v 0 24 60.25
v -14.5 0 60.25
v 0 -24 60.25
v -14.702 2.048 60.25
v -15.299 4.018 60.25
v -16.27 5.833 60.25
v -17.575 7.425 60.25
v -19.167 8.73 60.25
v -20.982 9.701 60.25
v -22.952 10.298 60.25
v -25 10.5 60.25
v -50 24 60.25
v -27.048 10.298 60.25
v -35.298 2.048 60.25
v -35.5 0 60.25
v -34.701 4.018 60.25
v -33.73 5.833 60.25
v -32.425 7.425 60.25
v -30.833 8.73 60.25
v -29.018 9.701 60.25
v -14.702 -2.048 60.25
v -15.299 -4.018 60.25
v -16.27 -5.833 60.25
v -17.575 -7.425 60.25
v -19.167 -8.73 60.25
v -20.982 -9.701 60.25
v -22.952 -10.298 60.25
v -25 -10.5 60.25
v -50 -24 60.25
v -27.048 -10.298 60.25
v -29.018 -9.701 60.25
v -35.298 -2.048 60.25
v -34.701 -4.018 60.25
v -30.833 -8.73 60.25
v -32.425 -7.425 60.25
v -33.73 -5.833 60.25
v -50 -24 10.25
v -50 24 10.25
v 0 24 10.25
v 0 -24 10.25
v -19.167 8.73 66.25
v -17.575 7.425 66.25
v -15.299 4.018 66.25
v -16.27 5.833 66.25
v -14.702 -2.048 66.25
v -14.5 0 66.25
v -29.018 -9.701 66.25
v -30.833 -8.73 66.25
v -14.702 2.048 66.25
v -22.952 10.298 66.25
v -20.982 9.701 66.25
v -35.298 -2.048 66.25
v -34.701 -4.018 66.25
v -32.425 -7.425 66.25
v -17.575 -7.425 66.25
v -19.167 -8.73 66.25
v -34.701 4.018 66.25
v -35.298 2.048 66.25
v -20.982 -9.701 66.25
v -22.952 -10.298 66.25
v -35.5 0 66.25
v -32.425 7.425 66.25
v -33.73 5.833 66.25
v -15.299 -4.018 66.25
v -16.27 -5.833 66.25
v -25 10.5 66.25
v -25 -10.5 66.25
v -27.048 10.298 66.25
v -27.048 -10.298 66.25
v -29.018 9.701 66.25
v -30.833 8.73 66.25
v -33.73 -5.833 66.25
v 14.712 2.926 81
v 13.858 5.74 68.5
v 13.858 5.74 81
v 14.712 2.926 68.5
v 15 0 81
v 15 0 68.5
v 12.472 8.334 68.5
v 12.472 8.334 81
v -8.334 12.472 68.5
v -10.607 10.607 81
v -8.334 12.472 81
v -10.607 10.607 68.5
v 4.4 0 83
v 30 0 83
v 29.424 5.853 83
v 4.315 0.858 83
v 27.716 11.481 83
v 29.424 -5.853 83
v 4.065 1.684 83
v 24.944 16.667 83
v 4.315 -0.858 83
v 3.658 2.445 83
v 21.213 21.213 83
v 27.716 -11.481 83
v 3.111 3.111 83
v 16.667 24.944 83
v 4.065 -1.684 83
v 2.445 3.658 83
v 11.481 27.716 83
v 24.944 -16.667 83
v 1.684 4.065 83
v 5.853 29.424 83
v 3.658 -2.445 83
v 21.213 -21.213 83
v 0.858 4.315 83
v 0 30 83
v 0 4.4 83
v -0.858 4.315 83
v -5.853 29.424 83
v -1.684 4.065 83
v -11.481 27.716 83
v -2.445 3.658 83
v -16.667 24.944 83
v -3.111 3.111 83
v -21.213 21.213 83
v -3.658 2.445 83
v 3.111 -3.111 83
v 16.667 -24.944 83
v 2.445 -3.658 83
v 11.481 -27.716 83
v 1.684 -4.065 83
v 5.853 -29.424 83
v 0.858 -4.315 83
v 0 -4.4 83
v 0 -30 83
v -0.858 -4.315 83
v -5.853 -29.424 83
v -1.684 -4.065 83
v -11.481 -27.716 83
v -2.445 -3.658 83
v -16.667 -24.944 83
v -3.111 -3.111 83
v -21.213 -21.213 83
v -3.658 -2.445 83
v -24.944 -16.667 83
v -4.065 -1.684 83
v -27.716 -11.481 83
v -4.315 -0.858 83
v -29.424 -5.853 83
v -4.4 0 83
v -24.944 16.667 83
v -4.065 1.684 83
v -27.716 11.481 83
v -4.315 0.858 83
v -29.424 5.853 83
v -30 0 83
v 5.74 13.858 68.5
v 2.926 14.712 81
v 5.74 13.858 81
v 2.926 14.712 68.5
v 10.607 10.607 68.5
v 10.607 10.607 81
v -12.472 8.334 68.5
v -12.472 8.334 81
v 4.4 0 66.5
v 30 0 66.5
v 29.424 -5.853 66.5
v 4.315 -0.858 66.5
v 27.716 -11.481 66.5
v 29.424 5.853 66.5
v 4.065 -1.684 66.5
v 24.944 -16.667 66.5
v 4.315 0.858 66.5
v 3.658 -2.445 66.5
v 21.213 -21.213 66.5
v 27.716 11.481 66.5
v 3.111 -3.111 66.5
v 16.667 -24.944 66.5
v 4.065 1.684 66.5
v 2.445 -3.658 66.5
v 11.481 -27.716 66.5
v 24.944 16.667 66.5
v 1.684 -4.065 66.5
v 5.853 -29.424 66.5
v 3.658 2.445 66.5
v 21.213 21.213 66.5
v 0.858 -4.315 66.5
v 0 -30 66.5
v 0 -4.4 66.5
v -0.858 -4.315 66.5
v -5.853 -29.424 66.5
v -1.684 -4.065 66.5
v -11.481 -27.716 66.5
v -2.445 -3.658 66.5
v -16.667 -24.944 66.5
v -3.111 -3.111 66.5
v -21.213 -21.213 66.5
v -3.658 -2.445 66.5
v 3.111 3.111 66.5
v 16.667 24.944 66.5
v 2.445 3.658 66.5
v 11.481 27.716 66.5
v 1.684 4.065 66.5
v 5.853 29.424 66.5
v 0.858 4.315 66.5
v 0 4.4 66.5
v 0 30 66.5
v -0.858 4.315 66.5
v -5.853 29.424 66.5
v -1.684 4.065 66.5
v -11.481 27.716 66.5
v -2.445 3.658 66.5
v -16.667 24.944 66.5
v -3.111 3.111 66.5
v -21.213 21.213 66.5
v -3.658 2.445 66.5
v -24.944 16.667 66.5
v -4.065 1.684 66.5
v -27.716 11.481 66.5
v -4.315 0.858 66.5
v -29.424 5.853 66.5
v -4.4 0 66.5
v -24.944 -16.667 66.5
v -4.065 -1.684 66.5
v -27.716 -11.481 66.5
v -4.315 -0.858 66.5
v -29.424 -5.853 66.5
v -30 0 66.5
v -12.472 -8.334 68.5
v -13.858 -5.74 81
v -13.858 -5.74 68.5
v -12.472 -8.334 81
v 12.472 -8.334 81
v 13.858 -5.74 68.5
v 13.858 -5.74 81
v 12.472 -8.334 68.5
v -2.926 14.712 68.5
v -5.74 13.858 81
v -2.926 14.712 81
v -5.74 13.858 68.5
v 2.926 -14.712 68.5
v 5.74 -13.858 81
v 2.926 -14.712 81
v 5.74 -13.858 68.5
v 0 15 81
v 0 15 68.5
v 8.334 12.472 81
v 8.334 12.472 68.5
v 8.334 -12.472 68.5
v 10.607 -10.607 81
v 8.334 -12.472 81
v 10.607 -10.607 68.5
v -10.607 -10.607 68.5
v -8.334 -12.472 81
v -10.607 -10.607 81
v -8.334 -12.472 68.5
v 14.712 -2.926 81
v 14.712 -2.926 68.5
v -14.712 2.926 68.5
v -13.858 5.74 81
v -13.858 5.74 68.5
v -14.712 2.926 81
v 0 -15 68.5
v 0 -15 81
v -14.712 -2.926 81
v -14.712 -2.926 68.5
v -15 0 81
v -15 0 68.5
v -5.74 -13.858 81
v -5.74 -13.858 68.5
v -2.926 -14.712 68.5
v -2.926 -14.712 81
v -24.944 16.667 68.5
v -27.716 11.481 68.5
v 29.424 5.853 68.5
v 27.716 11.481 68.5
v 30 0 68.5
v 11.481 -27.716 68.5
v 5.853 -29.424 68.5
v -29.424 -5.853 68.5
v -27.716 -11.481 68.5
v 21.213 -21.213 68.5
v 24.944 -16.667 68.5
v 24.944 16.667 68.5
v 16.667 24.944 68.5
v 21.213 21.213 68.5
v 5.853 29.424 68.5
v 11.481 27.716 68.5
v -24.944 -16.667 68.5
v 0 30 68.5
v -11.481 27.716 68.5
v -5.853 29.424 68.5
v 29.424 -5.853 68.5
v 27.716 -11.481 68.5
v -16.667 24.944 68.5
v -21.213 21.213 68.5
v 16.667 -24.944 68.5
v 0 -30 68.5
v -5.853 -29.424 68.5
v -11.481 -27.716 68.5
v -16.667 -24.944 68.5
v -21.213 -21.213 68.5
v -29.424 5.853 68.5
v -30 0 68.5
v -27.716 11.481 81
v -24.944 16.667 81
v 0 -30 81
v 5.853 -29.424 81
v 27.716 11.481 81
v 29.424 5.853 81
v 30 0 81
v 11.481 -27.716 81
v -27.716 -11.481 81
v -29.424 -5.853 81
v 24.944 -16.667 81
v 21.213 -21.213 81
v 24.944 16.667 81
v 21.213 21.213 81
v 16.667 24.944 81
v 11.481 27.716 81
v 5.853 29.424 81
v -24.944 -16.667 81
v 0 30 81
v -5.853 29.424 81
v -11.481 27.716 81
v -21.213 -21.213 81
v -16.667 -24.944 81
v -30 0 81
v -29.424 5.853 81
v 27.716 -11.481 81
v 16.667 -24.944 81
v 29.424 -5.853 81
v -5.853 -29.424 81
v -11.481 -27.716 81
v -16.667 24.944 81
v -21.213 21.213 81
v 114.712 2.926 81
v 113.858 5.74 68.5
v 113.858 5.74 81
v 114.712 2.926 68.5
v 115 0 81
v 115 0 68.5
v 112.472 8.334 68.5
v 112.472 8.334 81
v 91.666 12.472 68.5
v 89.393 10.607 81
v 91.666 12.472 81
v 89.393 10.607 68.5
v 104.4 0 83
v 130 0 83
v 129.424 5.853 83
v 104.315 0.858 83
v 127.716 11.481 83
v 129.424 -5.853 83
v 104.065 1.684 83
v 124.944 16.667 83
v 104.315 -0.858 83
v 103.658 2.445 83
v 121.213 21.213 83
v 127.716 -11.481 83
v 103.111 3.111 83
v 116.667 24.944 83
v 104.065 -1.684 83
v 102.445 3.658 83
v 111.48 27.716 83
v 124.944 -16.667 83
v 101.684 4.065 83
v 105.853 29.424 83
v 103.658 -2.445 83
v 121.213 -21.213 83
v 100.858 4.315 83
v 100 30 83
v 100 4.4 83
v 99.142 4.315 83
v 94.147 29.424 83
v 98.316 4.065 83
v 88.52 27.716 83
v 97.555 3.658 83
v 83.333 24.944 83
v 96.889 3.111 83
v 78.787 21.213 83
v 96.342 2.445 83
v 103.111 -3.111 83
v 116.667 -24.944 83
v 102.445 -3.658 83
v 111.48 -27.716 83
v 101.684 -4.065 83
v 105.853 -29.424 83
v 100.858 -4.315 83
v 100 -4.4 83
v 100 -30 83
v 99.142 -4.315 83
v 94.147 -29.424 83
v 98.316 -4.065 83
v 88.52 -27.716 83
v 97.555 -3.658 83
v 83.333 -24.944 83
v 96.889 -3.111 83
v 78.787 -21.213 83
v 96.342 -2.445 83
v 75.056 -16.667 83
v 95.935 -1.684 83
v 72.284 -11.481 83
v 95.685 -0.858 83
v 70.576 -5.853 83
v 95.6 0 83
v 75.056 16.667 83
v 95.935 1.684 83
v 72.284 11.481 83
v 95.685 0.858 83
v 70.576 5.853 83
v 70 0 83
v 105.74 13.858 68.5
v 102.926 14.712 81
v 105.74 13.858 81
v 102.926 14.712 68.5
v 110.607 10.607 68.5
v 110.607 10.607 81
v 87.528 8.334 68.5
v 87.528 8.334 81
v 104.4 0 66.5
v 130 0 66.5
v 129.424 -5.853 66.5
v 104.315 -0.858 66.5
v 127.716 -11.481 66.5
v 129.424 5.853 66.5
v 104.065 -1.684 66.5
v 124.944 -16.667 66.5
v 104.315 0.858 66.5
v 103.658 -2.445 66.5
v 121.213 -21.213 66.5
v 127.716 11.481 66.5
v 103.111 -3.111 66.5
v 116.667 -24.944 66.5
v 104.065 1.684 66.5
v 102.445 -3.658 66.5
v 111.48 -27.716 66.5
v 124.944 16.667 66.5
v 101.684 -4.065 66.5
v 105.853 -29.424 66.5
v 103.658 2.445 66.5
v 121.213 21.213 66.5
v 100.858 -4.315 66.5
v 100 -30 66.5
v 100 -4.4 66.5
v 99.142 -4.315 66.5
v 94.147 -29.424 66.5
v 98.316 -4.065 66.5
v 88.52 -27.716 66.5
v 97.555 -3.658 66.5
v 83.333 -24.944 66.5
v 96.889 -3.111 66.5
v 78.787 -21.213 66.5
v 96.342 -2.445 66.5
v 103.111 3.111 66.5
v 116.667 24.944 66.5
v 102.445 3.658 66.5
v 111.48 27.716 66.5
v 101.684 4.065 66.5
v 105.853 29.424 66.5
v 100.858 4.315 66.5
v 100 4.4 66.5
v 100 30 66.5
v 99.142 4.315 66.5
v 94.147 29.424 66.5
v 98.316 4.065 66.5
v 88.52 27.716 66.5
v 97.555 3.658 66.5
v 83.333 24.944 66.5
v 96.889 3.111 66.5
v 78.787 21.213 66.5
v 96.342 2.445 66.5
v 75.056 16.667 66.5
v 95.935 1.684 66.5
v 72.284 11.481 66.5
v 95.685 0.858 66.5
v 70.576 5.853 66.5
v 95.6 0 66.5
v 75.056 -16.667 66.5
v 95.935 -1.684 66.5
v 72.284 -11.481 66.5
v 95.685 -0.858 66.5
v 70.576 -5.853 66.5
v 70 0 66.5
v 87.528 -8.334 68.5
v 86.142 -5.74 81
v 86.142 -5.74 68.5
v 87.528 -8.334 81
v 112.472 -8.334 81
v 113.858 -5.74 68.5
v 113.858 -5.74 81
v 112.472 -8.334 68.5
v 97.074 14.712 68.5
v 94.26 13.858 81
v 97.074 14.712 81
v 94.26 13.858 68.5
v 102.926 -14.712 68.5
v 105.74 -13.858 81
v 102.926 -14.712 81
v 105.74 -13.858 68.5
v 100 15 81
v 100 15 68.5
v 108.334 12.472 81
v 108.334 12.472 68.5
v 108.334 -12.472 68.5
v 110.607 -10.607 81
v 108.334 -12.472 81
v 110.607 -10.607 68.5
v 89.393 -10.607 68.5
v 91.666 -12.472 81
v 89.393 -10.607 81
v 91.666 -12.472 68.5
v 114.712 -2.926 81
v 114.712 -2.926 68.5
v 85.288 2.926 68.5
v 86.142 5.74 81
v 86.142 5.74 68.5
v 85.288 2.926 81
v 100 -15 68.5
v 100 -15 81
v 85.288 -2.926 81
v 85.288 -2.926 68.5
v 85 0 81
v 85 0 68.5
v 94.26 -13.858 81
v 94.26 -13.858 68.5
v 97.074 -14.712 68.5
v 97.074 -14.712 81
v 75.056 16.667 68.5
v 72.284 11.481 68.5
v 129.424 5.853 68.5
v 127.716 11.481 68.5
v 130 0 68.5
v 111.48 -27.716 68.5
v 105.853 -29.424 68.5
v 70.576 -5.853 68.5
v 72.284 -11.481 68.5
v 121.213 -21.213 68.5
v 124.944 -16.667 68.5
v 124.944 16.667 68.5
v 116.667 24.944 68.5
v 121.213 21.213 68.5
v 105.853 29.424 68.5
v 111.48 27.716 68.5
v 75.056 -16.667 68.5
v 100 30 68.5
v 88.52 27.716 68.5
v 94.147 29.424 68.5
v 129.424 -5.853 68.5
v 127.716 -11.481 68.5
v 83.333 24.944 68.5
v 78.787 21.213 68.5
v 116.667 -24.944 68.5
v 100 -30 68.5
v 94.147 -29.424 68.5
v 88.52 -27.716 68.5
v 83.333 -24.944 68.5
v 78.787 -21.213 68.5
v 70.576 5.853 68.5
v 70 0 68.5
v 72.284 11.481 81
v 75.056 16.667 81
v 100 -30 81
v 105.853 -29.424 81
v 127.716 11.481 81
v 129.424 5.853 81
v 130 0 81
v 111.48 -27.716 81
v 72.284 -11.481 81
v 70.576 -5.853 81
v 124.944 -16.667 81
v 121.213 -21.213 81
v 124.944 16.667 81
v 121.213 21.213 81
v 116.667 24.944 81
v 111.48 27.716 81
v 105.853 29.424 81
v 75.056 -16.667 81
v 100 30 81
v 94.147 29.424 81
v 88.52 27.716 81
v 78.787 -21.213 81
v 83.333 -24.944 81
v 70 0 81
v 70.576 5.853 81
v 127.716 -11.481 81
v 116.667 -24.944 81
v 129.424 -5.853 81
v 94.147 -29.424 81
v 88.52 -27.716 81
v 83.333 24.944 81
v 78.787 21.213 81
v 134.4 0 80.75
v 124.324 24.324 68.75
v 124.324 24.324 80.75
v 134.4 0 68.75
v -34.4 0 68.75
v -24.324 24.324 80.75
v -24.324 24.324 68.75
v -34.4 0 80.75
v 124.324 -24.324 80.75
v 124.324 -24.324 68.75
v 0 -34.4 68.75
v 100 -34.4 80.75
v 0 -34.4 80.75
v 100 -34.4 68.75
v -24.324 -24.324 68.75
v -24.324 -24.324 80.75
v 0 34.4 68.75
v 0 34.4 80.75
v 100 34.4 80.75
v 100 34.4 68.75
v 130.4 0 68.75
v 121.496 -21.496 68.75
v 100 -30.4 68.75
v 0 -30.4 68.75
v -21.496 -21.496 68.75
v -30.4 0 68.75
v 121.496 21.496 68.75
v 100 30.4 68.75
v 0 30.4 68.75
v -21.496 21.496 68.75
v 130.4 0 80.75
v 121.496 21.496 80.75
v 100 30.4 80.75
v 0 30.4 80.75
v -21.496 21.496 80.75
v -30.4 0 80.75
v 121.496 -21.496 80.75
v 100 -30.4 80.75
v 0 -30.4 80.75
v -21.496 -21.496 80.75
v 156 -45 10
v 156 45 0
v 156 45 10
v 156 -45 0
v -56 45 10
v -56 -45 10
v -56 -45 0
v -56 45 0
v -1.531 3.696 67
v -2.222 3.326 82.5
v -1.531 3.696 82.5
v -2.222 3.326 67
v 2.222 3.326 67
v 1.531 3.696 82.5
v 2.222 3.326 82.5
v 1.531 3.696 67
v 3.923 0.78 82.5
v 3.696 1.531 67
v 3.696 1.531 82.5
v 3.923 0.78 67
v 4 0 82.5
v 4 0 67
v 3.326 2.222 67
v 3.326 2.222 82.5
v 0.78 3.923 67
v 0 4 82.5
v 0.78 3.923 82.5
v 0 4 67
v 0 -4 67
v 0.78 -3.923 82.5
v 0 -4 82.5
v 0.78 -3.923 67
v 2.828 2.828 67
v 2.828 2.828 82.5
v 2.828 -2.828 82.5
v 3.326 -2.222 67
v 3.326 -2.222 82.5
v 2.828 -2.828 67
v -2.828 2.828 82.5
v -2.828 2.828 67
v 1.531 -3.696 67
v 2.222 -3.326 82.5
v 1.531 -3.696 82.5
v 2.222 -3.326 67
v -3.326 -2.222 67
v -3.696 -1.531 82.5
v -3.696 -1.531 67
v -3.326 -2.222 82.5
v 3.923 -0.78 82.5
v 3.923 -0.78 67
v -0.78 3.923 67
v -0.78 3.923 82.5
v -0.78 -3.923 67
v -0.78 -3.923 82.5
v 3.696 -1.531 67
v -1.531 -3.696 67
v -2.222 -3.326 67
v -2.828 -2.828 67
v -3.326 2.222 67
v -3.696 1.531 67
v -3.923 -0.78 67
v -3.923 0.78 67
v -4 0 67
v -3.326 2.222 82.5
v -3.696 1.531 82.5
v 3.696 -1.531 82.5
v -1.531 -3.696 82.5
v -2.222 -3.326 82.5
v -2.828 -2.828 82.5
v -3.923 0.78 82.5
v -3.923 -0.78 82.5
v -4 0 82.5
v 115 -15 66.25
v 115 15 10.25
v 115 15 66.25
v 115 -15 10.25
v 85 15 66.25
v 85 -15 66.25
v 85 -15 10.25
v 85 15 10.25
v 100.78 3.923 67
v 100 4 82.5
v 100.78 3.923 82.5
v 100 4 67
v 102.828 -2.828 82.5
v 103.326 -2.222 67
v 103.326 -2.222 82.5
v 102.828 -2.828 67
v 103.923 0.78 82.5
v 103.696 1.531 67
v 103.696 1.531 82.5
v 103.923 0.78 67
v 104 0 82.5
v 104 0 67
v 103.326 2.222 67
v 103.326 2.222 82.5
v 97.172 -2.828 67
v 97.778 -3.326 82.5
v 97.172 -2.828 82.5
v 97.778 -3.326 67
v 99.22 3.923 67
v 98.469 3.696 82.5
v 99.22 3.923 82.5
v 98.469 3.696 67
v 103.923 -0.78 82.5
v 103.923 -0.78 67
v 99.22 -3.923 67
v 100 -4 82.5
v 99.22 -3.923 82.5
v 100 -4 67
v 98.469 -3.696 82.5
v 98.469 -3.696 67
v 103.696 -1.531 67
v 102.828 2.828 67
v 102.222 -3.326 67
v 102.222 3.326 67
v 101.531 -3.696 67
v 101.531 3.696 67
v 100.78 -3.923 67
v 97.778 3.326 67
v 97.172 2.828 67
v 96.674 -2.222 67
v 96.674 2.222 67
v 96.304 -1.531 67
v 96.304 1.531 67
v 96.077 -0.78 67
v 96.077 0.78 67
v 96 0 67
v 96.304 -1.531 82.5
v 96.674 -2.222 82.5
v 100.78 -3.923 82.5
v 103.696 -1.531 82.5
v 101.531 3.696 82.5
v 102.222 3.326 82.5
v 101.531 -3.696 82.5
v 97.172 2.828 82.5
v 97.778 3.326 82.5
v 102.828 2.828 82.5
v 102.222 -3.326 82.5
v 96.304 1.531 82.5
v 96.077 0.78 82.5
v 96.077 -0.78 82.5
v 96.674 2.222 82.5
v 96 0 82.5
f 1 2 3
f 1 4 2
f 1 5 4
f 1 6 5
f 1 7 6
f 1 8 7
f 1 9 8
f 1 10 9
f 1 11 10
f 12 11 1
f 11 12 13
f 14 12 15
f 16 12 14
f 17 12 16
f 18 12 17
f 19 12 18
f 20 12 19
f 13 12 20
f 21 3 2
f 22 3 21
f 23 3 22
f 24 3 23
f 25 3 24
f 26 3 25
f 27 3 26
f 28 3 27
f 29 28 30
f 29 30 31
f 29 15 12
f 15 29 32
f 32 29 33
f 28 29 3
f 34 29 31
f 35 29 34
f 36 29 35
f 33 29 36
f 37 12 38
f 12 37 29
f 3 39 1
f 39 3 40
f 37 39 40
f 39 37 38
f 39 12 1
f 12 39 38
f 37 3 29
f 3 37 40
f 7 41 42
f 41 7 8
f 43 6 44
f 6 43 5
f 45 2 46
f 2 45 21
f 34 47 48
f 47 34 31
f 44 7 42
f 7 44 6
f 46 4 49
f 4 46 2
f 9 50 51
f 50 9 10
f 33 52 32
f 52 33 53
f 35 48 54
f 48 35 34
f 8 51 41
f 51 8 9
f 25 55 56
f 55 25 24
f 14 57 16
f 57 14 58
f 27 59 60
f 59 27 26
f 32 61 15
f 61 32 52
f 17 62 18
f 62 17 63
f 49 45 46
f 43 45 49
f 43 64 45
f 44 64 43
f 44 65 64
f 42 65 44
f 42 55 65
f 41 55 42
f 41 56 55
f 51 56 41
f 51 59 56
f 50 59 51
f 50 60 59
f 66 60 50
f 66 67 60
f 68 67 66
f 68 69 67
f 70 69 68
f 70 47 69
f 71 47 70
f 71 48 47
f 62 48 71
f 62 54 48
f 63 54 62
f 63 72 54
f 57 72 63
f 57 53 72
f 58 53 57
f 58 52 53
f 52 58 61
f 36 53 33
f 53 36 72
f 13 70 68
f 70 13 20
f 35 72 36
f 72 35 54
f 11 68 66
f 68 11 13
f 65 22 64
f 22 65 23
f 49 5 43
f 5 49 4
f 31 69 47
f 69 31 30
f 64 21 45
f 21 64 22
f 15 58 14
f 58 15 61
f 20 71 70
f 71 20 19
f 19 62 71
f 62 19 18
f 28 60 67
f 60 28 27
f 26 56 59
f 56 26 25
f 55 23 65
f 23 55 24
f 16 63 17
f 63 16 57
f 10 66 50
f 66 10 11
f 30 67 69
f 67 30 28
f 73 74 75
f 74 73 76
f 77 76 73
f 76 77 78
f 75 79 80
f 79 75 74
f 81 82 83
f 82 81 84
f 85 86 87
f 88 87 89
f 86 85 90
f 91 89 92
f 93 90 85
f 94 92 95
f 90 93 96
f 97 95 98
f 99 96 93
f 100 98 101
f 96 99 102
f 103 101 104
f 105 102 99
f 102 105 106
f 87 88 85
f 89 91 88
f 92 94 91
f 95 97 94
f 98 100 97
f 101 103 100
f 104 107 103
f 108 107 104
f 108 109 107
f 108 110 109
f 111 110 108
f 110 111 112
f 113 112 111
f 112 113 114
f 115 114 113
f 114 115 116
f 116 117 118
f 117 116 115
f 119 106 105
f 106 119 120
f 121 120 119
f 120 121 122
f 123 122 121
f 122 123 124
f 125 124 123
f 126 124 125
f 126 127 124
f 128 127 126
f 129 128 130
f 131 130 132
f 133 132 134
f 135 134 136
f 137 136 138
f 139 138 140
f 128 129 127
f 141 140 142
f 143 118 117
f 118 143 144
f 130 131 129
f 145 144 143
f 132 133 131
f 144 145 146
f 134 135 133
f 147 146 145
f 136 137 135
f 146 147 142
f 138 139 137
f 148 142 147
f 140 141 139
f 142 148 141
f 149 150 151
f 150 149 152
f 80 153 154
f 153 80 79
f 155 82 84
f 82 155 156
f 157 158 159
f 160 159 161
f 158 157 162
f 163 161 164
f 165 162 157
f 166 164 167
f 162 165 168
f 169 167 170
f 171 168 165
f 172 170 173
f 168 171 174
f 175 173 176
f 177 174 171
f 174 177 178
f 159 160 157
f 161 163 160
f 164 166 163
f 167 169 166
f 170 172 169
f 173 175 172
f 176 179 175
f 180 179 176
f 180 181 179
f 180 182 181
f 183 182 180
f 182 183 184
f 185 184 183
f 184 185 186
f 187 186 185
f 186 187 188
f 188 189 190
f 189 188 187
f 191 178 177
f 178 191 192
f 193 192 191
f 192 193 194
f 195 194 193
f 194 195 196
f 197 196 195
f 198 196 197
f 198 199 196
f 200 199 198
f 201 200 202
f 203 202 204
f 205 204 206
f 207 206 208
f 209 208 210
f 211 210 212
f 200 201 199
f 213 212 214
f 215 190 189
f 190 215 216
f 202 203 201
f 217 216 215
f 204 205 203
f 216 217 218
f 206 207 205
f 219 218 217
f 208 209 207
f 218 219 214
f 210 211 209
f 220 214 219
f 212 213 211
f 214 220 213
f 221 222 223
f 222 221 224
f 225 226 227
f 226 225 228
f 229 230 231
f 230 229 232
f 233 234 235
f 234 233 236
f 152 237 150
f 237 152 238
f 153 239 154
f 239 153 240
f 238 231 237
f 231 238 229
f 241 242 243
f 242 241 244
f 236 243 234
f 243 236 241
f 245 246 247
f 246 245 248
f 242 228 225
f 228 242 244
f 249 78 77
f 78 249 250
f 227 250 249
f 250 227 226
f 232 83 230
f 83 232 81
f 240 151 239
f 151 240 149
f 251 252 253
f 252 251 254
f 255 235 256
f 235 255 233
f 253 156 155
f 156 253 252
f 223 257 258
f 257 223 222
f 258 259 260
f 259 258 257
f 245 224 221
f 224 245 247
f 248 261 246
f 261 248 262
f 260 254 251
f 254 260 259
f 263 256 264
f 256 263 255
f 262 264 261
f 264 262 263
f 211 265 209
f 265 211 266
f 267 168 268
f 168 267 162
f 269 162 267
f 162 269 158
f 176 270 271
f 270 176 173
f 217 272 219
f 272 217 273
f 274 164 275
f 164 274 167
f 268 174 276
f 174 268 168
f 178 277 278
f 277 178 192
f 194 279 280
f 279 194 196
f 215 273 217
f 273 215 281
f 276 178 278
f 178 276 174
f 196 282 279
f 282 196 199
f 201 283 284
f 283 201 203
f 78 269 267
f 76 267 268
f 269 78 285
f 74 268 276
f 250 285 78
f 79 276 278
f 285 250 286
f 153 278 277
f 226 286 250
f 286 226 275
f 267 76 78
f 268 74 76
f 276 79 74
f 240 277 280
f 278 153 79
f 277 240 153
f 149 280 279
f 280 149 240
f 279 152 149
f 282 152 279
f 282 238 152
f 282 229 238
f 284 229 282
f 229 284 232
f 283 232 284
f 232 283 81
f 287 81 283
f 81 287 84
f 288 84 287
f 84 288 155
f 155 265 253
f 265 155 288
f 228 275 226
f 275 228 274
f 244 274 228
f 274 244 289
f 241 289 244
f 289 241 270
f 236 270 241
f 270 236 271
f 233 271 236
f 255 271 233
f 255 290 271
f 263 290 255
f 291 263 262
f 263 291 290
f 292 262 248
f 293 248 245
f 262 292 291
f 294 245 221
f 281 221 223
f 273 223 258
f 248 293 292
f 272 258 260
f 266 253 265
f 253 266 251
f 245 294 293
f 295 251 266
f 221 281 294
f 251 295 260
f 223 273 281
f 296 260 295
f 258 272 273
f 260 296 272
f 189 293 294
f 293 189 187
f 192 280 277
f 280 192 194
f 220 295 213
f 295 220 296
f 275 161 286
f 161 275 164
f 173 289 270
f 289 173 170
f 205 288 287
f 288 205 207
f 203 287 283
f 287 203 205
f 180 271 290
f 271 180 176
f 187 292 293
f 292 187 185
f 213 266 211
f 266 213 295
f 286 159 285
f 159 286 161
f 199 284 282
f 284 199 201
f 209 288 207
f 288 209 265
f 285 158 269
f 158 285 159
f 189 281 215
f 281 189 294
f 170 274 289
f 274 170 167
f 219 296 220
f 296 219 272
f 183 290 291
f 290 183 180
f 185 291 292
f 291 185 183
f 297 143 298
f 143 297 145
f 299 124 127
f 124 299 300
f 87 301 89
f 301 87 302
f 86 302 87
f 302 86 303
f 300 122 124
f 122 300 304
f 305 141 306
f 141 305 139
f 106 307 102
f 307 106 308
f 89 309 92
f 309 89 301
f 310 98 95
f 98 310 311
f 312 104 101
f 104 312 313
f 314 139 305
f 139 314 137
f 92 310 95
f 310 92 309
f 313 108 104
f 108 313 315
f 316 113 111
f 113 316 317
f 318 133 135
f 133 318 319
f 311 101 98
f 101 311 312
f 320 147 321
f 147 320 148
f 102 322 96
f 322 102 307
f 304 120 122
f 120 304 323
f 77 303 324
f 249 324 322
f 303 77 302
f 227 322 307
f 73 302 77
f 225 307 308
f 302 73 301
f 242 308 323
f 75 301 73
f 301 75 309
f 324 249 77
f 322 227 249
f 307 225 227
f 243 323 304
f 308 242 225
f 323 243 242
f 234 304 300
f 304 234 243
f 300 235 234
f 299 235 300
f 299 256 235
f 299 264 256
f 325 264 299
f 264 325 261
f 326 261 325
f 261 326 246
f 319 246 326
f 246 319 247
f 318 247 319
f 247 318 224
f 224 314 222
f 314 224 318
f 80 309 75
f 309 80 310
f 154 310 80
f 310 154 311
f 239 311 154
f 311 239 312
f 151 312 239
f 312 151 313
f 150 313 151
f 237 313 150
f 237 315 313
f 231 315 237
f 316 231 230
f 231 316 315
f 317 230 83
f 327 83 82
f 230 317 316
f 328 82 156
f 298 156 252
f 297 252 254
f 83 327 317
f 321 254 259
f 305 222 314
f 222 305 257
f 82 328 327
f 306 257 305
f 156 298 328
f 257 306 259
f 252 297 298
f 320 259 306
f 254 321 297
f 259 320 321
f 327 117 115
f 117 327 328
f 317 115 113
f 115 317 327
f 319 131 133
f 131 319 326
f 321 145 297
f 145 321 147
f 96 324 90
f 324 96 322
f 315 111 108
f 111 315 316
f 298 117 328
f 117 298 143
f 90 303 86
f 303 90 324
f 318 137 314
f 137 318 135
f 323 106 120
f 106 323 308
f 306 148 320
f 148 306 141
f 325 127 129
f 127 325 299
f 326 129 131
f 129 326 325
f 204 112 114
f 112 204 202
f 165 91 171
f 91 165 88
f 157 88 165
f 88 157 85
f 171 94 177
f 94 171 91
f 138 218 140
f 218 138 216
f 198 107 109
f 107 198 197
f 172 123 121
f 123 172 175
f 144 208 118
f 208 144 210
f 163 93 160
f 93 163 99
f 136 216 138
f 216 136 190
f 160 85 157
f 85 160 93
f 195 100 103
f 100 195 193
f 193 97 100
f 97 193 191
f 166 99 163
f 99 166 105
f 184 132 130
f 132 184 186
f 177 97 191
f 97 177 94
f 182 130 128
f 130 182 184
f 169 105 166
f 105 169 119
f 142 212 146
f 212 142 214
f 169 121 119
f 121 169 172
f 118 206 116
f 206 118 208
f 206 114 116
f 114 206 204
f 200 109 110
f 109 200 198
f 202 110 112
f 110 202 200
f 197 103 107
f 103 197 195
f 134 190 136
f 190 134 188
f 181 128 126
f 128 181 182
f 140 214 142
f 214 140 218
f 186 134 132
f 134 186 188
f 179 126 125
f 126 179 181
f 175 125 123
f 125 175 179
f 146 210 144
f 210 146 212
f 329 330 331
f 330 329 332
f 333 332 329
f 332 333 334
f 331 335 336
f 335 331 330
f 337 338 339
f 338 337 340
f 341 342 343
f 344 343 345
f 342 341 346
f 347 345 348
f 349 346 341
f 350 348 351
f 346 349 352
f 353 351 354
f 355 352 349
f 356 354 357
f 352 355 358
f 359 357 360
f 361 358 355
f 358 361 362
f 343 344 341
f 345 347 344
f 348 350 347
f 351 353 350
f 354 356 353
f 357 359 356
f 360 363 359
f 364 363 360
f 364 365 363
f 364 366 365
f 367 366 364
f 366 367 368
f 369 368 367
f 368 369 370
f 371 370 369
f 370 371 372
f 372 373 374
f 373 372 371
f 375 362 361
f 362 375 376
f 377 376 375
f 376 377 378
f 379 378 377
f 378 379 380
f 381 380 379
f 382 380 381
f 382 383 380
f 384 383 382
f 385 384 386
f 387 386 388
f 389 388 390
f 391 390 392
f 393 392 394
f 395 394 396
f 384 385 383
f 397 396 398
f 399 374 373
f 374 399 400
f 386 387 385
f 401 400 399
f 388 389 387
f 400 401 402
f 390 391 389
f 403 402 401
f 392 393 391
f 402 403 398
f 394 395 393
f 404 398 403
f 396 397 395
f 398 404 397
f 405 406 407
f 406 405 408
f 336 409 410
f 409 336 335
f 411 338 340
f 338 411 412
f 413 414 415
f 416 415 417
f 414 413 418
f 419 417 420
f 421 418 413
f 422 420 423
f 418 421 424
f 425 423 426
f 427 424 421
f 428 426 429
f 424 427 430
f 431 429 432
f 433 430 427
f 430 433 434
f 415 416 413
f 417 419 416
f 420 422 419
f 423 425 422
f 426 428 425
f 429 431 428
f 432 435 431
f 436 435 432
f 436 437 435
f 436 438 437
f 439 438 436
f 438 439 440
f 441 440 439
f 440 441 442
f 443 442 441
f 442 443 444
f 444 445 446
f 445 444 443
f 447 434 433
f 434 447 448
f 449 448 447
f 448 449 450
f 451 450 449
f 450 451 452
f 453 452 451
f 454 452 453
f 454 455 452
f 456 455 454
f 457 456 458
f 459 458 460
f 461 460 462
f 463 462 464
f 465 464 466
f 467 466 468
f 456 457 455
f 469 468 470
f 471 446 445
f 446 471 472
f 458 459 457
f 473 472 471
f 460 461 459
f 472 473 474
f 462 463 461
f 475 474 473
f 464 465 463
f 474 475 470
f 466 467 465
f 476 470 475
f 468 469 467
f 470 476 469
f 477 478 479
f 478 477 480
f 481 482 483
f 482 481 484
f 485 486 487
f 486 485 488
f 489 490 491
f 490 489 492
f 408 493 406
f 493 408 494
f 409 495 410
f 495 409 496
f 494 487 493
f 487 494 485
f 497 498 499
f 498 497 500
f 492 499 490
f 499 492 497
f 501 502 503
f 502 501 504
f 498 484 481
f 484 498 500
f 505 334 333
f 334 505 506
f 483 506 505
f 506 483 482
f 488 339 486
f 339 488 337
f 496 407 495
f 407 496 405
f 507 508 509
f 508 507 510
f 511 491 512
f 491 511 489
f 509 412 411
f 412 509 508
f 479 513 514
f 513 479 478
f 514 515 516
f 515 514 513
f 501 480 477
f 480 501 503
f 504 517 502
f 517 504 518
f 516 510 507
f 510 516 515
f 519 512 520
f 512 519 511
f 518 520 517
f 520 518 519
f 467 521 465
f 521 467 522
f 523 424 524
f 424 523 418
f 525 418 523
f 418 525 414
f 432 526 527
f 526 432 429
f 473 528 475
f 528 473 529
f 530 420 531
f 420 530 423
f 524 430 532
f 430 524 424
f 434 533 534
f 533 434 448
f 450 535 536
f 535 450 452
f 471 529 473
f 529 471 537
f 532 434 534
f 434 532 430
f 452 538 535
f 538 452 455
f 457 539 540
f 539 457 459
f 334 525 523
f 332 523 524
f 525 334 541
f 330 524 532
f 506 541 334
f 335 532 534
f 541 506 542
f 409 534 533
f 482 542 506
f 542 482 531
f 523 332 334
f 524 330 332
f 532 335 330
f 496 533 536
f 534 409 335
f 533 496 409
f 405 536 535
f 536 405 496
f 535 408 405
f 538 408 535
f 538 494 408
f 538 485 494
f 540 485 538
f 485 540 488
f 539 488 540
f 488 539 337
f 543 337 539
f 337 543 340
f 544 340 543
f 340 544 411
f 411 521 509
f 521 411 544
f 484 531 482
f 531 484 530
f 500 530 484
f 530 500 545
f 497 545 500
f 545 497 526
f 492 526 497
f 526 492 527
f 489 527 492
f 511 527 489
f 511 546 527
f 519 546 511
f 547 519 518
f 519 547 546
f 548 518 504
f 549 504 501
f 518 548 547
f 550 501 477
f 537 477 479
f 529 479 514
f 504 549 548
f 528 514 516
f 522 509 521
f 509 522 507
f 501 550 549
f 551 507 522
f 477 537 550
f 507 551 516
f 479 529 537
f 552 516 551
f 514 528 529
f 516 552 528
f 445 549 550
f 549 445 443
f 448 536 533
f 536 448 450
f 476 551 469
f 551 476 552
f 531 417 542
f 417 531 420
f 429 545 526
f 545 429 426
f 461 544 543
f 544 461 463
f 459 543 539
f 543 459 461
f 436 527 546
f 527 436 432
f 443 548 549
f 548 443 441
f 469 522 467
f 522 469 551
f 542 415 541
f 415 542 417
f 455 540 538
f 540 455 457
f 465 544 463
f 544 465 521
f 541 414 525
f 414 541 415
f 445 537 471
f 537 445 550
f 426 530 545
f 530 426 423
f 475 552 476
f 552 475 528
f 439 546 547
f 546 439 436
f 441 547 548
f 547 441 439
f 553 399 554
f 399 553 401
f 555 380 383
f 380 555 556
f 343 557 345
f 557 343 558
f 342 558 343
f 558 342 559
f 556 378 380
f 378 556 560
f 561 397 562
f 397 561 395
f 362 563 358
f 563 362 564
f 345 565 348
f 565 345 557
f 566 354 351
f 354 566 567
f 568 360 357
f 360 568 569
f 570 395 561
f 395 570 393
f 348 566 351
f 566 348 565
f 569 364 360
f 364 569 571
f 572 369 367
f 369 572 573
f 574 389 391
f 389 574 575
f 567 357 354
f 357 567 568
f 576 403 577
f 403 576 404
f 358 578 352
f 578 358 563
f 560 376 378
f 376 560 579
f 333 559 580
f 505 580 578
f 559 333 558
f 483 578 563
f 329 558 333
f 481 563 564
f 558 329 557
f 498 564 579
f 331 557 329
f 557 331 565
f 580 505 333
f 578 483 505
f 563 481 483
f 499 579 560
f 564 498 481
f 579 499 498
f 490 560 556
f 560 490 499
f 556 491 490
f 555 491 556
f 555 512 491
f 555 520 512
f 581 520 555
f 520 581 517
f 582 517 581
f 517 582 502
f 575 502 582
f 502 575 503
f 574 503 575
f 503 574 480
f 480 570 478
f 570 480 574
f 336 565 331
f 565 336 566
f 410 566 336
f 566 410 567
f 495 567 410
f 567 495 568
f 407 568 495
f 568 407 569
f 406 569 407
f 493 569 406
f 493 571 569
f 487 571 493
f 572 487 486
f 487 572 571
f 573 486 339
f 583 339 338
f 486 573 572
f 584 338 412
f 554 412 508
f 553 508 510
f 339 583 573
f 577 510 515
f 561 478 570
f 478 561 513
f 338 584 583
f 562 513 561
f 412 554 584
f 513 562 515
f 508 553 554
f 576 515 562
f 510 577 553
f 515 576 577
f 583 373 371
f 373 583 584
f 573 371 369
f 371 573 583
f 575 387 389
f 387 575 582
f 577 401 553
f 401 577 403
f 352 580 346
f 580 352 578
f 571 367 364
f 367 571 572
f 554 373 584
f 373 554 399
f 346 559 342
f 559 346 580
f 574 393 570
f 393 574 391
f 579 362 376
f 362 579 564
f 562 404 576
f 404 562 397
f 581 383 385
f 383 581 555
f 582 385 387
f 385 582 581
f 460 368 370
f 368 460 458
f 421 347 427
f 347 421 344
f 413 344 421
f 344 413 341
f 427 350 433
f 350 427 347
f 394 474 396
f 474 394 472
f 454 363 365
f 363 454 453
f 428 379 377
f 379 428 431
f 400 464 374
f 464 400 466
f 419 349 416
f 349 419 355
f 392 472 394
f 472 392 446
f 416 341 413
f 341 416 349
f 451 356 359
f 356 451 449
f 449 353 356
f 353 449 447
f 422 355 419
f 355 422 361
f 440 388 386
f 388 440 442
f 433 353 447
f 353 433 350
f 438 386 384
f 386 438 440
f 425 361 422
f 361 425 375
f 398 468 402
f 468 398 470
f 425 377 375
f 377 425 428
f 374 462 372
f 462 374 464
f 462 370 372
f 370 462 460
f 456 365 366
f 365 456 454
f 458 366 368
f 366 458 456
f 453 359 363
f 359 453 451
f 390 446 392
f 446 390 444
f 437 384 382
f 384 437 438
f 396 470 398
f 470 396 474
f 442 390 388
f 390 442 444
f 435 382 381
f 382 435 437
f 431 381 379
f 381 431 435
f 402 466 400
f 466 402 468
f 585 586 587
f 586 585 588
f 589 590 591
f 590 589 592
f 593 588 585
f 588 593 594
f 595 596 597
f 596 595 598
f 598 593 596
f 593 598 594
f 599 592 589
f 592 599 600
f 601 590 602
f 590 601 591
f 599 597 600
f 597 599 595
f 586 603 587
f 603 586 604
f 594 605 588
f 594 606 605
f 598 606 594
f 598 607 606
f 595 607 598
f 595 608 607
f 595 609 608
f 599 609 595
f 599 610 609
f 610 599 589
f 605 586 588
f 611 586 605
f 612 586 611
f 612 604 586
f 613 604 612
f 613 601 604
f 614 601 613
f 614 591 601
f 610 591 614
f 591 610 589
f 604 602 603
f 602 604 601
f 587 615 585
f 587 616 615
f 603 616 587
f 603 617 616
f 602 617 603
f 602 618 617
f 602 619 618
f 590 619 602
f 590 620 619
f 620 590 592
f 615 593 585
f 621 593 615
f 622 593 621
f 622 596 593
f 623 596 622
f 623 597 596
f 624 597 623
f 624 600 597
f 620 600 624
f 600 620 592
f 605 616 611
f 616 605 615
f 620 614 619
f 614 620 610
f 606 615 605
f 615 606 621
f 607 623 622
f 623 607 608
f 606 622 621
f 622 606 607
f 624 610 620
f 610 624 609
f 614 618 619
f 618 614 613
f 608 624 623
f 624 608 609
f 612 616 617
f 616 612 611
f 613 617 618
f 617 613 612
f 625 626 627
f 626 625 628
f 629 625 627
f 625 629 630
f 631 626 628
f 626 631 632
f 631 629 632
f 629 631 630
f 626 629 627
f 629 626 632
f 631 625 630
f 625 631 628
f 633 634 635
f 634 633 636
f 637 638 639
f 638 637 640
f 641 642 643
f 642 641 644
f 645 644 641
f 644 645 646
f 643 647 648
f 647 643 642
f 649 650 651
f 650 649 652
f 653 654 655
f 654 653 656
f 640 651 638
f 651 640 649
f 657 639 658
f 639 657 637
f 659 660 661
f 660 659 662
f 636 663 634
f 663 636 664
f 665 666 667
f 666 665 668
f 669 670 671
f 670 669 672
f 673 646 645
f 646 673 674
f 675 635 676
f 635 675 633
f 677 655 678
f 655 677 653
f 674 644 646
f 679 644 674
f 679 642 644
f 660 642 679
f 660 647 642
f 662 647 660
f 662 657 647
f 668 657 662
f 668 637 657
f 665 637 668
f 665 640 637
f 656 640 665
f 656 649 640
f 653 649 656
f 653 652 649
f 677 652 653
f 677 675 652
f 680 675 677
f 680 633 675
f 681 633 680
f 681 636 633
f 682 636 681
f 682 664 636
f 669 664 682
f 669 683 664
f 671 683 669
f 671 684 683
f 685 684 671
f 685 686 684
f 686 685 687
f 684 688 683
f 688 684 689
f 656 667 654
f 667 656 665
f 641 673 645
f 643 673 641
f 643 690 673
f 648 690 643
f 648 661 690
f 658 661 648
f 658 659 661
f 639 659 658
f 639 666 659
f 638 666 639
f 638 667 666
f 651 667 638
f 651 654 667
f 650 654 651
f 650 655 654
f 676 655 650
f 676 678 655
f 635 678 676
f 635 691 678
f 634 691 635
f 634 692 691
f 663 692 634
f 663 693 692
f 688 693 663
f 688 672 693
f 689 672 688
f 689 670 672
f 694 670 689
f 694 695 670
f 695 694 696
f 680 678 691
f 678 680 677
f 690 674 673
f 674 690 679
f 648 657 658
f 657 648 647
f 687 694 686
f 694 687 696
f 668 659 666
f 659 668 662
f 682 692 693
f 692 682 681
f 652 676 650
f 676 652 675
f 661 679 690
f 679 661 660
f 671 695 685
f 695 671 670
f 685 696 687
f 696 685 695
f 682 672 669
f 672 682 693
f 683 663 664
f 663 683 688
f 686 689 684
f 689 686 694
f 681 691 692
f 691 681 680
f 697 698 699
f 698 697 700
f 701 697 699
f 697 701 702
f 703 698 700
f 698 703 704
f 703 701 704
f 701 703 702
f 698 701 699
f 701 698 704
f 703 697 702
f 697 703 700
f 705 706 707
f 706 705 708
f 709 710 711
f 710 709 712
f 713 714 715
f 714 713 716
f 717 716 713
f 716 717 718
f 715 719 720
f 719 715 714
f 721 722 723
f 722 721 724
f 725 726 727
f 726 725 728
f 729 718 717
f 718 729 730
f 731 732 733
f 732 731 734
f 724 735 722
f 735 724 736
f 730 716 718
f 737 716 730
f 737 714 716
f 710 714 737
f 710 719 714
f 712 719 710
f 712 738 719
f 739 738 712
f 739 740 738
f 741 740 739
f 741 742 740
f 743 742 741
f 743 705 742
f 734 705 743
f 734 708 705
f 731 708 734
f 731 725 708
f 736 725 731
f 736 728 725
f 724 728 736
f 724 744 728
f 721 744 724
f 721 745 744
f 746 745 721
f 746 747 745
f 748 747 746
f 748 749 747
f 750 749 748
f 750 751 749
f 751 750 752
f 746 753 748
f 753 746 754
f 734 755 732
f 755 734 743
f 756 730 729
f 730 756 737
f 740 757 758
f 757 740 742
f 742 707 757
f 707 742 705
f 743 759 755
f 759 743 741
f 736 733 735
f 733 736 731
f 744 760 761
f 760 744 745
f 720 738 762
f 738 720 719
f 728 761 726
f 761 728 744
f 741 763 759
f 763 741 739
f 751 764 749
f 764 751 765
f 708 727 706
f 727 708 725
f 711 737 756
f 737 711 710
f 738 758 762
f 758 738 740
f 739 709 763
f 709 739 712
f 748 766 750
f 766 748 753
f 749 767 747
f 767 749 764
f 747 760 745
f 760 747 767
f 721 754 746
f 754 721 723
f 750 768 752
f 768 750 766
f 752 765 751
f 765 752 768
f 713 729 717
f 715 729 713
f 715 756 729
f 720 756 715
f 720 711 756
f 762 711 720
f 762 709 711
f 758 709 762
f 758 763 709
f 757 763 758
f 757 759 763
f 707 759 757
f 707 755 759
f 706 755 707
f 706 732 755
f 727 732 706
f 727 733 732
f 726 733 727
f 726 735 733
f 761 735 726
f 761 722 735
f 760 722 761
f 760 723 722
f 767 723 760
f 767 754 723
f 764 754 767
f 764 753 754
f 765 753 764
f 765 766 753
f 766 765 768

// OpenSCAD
$fn = 32;

// ------------------------------------------------------------------------
// Motor belt drive: span 100 mm, pulleys d60, belt 12 mm wide
// Every part is its own module, assembly() places every instance.
// ------------------------------------------------------------------------

// --- part 1 ---
module base_plate() {
  difference() {
    translate([-106, -45, 0]) cube([212, 90, 10]);
  }
}

// --- part 2 ---
module motor() {
  union() {
    translate([-25, -24, 0]) cube([50, 48, 50]);
    translate([28, 0, 25]) rotate([0, 90, 0]) cylinder(h = 6, d = 21, center = true);
  }
}

// --- part 3 ---
module drive_shaft() {
  translate([0, 0, -7.75]) cylinder(h = 15.5, d = 8);
}

// --- part 4 ---
module pulley_drive() {
  difference() {
    union() {
      cylinder(h = 16.5, d = 30);
      cylinder(h = 2, d = 60);
      translate([0, 0, 14.5]) cylinder(h = 2, d = 60);
    }
    translate([0, 0, -1]) cylinder(h = 18.5, d = 8.8);
  }
}

// --- part 5 ---
module idler_post() {
  translate([-15, -15, 0]) cube([30, 30, 56]);
}

// --- part 6 ---
module driven_shaft() {
  translate([0, 0, -7.75]) cylinder(h = 15.5, d = 8);
}

// --- part 7 ---
module pulley_driven() {
  difference() {
    union() {
      cylinder(h = 16.5, d = 30);
      cylinder(h = 2, d = 60);
      translate([0, 0, 14.5]) cylinder(h = 2, d = 60);
    }
    translate([0, 0, -1]) cylinder(h = 18.5, d = 8.8);
  }
}

// --- part 8 ---
module drive_belt() {
  difference() {
    linear_extrude(height = 12) polygon(points = concat([for (a = [90 : 45 : 270]) [34.4 * cos(a), 34.4 * sin(a)]], [for (a = [270 : 45 : 450]) [100 + 34.4 * cos(a), 34.4 * sin(a)]]));
    translate([0, 0, -1]) linear_extrude(height = 14) polygon(points = concat([for (a = [90 : 45 : 270]) [30.4 * cos(a), 30.4 * sin(a)]], [for (a = [270 : 45 : 450]) [100 + 30.4 * cos(a), 30.4 * sin(a)]]));
  }
}

// --- assembly ---
module assembly() {
  color([0.80, 0.24, 0.20]) translate([50, 0, 0]) rotate([0, 0, 0]) base_plate();
  color([0.20, 0.45, 0.75]) translate([0, 0, 35.25]) rotate([0, 270, 0]) motor();
  color([0.25, 0.62, 0.32]) translate([0, 0, 74.75]) rotate([0, 0, 0]) drive_shaft();
  color([0.92, 0.70, 0.18]) translate([0, 0, 66.5]) rotate([0, 0, 0]) pulley_drive();
  color([0.58, 0.35, 0.70]) translate([100, 0, 10.25]) rotate([0, 0, 0]) idler_post();
  color([0.16, 0.66, 0.66]) translate([100, 0, 74.75]) rotate([0, 0, 0]) driven_shaft();
  color([0.85, 0.48, 0.18]) translate([100, 0, 66.5]) rotate([0, 0, 0]) pulley_driven();
  color([0.55, 0.60, 0.65]) translate([0, 0, 68.75]) rotate([0, 0, 0]) drive_belt();
}

assembly();
